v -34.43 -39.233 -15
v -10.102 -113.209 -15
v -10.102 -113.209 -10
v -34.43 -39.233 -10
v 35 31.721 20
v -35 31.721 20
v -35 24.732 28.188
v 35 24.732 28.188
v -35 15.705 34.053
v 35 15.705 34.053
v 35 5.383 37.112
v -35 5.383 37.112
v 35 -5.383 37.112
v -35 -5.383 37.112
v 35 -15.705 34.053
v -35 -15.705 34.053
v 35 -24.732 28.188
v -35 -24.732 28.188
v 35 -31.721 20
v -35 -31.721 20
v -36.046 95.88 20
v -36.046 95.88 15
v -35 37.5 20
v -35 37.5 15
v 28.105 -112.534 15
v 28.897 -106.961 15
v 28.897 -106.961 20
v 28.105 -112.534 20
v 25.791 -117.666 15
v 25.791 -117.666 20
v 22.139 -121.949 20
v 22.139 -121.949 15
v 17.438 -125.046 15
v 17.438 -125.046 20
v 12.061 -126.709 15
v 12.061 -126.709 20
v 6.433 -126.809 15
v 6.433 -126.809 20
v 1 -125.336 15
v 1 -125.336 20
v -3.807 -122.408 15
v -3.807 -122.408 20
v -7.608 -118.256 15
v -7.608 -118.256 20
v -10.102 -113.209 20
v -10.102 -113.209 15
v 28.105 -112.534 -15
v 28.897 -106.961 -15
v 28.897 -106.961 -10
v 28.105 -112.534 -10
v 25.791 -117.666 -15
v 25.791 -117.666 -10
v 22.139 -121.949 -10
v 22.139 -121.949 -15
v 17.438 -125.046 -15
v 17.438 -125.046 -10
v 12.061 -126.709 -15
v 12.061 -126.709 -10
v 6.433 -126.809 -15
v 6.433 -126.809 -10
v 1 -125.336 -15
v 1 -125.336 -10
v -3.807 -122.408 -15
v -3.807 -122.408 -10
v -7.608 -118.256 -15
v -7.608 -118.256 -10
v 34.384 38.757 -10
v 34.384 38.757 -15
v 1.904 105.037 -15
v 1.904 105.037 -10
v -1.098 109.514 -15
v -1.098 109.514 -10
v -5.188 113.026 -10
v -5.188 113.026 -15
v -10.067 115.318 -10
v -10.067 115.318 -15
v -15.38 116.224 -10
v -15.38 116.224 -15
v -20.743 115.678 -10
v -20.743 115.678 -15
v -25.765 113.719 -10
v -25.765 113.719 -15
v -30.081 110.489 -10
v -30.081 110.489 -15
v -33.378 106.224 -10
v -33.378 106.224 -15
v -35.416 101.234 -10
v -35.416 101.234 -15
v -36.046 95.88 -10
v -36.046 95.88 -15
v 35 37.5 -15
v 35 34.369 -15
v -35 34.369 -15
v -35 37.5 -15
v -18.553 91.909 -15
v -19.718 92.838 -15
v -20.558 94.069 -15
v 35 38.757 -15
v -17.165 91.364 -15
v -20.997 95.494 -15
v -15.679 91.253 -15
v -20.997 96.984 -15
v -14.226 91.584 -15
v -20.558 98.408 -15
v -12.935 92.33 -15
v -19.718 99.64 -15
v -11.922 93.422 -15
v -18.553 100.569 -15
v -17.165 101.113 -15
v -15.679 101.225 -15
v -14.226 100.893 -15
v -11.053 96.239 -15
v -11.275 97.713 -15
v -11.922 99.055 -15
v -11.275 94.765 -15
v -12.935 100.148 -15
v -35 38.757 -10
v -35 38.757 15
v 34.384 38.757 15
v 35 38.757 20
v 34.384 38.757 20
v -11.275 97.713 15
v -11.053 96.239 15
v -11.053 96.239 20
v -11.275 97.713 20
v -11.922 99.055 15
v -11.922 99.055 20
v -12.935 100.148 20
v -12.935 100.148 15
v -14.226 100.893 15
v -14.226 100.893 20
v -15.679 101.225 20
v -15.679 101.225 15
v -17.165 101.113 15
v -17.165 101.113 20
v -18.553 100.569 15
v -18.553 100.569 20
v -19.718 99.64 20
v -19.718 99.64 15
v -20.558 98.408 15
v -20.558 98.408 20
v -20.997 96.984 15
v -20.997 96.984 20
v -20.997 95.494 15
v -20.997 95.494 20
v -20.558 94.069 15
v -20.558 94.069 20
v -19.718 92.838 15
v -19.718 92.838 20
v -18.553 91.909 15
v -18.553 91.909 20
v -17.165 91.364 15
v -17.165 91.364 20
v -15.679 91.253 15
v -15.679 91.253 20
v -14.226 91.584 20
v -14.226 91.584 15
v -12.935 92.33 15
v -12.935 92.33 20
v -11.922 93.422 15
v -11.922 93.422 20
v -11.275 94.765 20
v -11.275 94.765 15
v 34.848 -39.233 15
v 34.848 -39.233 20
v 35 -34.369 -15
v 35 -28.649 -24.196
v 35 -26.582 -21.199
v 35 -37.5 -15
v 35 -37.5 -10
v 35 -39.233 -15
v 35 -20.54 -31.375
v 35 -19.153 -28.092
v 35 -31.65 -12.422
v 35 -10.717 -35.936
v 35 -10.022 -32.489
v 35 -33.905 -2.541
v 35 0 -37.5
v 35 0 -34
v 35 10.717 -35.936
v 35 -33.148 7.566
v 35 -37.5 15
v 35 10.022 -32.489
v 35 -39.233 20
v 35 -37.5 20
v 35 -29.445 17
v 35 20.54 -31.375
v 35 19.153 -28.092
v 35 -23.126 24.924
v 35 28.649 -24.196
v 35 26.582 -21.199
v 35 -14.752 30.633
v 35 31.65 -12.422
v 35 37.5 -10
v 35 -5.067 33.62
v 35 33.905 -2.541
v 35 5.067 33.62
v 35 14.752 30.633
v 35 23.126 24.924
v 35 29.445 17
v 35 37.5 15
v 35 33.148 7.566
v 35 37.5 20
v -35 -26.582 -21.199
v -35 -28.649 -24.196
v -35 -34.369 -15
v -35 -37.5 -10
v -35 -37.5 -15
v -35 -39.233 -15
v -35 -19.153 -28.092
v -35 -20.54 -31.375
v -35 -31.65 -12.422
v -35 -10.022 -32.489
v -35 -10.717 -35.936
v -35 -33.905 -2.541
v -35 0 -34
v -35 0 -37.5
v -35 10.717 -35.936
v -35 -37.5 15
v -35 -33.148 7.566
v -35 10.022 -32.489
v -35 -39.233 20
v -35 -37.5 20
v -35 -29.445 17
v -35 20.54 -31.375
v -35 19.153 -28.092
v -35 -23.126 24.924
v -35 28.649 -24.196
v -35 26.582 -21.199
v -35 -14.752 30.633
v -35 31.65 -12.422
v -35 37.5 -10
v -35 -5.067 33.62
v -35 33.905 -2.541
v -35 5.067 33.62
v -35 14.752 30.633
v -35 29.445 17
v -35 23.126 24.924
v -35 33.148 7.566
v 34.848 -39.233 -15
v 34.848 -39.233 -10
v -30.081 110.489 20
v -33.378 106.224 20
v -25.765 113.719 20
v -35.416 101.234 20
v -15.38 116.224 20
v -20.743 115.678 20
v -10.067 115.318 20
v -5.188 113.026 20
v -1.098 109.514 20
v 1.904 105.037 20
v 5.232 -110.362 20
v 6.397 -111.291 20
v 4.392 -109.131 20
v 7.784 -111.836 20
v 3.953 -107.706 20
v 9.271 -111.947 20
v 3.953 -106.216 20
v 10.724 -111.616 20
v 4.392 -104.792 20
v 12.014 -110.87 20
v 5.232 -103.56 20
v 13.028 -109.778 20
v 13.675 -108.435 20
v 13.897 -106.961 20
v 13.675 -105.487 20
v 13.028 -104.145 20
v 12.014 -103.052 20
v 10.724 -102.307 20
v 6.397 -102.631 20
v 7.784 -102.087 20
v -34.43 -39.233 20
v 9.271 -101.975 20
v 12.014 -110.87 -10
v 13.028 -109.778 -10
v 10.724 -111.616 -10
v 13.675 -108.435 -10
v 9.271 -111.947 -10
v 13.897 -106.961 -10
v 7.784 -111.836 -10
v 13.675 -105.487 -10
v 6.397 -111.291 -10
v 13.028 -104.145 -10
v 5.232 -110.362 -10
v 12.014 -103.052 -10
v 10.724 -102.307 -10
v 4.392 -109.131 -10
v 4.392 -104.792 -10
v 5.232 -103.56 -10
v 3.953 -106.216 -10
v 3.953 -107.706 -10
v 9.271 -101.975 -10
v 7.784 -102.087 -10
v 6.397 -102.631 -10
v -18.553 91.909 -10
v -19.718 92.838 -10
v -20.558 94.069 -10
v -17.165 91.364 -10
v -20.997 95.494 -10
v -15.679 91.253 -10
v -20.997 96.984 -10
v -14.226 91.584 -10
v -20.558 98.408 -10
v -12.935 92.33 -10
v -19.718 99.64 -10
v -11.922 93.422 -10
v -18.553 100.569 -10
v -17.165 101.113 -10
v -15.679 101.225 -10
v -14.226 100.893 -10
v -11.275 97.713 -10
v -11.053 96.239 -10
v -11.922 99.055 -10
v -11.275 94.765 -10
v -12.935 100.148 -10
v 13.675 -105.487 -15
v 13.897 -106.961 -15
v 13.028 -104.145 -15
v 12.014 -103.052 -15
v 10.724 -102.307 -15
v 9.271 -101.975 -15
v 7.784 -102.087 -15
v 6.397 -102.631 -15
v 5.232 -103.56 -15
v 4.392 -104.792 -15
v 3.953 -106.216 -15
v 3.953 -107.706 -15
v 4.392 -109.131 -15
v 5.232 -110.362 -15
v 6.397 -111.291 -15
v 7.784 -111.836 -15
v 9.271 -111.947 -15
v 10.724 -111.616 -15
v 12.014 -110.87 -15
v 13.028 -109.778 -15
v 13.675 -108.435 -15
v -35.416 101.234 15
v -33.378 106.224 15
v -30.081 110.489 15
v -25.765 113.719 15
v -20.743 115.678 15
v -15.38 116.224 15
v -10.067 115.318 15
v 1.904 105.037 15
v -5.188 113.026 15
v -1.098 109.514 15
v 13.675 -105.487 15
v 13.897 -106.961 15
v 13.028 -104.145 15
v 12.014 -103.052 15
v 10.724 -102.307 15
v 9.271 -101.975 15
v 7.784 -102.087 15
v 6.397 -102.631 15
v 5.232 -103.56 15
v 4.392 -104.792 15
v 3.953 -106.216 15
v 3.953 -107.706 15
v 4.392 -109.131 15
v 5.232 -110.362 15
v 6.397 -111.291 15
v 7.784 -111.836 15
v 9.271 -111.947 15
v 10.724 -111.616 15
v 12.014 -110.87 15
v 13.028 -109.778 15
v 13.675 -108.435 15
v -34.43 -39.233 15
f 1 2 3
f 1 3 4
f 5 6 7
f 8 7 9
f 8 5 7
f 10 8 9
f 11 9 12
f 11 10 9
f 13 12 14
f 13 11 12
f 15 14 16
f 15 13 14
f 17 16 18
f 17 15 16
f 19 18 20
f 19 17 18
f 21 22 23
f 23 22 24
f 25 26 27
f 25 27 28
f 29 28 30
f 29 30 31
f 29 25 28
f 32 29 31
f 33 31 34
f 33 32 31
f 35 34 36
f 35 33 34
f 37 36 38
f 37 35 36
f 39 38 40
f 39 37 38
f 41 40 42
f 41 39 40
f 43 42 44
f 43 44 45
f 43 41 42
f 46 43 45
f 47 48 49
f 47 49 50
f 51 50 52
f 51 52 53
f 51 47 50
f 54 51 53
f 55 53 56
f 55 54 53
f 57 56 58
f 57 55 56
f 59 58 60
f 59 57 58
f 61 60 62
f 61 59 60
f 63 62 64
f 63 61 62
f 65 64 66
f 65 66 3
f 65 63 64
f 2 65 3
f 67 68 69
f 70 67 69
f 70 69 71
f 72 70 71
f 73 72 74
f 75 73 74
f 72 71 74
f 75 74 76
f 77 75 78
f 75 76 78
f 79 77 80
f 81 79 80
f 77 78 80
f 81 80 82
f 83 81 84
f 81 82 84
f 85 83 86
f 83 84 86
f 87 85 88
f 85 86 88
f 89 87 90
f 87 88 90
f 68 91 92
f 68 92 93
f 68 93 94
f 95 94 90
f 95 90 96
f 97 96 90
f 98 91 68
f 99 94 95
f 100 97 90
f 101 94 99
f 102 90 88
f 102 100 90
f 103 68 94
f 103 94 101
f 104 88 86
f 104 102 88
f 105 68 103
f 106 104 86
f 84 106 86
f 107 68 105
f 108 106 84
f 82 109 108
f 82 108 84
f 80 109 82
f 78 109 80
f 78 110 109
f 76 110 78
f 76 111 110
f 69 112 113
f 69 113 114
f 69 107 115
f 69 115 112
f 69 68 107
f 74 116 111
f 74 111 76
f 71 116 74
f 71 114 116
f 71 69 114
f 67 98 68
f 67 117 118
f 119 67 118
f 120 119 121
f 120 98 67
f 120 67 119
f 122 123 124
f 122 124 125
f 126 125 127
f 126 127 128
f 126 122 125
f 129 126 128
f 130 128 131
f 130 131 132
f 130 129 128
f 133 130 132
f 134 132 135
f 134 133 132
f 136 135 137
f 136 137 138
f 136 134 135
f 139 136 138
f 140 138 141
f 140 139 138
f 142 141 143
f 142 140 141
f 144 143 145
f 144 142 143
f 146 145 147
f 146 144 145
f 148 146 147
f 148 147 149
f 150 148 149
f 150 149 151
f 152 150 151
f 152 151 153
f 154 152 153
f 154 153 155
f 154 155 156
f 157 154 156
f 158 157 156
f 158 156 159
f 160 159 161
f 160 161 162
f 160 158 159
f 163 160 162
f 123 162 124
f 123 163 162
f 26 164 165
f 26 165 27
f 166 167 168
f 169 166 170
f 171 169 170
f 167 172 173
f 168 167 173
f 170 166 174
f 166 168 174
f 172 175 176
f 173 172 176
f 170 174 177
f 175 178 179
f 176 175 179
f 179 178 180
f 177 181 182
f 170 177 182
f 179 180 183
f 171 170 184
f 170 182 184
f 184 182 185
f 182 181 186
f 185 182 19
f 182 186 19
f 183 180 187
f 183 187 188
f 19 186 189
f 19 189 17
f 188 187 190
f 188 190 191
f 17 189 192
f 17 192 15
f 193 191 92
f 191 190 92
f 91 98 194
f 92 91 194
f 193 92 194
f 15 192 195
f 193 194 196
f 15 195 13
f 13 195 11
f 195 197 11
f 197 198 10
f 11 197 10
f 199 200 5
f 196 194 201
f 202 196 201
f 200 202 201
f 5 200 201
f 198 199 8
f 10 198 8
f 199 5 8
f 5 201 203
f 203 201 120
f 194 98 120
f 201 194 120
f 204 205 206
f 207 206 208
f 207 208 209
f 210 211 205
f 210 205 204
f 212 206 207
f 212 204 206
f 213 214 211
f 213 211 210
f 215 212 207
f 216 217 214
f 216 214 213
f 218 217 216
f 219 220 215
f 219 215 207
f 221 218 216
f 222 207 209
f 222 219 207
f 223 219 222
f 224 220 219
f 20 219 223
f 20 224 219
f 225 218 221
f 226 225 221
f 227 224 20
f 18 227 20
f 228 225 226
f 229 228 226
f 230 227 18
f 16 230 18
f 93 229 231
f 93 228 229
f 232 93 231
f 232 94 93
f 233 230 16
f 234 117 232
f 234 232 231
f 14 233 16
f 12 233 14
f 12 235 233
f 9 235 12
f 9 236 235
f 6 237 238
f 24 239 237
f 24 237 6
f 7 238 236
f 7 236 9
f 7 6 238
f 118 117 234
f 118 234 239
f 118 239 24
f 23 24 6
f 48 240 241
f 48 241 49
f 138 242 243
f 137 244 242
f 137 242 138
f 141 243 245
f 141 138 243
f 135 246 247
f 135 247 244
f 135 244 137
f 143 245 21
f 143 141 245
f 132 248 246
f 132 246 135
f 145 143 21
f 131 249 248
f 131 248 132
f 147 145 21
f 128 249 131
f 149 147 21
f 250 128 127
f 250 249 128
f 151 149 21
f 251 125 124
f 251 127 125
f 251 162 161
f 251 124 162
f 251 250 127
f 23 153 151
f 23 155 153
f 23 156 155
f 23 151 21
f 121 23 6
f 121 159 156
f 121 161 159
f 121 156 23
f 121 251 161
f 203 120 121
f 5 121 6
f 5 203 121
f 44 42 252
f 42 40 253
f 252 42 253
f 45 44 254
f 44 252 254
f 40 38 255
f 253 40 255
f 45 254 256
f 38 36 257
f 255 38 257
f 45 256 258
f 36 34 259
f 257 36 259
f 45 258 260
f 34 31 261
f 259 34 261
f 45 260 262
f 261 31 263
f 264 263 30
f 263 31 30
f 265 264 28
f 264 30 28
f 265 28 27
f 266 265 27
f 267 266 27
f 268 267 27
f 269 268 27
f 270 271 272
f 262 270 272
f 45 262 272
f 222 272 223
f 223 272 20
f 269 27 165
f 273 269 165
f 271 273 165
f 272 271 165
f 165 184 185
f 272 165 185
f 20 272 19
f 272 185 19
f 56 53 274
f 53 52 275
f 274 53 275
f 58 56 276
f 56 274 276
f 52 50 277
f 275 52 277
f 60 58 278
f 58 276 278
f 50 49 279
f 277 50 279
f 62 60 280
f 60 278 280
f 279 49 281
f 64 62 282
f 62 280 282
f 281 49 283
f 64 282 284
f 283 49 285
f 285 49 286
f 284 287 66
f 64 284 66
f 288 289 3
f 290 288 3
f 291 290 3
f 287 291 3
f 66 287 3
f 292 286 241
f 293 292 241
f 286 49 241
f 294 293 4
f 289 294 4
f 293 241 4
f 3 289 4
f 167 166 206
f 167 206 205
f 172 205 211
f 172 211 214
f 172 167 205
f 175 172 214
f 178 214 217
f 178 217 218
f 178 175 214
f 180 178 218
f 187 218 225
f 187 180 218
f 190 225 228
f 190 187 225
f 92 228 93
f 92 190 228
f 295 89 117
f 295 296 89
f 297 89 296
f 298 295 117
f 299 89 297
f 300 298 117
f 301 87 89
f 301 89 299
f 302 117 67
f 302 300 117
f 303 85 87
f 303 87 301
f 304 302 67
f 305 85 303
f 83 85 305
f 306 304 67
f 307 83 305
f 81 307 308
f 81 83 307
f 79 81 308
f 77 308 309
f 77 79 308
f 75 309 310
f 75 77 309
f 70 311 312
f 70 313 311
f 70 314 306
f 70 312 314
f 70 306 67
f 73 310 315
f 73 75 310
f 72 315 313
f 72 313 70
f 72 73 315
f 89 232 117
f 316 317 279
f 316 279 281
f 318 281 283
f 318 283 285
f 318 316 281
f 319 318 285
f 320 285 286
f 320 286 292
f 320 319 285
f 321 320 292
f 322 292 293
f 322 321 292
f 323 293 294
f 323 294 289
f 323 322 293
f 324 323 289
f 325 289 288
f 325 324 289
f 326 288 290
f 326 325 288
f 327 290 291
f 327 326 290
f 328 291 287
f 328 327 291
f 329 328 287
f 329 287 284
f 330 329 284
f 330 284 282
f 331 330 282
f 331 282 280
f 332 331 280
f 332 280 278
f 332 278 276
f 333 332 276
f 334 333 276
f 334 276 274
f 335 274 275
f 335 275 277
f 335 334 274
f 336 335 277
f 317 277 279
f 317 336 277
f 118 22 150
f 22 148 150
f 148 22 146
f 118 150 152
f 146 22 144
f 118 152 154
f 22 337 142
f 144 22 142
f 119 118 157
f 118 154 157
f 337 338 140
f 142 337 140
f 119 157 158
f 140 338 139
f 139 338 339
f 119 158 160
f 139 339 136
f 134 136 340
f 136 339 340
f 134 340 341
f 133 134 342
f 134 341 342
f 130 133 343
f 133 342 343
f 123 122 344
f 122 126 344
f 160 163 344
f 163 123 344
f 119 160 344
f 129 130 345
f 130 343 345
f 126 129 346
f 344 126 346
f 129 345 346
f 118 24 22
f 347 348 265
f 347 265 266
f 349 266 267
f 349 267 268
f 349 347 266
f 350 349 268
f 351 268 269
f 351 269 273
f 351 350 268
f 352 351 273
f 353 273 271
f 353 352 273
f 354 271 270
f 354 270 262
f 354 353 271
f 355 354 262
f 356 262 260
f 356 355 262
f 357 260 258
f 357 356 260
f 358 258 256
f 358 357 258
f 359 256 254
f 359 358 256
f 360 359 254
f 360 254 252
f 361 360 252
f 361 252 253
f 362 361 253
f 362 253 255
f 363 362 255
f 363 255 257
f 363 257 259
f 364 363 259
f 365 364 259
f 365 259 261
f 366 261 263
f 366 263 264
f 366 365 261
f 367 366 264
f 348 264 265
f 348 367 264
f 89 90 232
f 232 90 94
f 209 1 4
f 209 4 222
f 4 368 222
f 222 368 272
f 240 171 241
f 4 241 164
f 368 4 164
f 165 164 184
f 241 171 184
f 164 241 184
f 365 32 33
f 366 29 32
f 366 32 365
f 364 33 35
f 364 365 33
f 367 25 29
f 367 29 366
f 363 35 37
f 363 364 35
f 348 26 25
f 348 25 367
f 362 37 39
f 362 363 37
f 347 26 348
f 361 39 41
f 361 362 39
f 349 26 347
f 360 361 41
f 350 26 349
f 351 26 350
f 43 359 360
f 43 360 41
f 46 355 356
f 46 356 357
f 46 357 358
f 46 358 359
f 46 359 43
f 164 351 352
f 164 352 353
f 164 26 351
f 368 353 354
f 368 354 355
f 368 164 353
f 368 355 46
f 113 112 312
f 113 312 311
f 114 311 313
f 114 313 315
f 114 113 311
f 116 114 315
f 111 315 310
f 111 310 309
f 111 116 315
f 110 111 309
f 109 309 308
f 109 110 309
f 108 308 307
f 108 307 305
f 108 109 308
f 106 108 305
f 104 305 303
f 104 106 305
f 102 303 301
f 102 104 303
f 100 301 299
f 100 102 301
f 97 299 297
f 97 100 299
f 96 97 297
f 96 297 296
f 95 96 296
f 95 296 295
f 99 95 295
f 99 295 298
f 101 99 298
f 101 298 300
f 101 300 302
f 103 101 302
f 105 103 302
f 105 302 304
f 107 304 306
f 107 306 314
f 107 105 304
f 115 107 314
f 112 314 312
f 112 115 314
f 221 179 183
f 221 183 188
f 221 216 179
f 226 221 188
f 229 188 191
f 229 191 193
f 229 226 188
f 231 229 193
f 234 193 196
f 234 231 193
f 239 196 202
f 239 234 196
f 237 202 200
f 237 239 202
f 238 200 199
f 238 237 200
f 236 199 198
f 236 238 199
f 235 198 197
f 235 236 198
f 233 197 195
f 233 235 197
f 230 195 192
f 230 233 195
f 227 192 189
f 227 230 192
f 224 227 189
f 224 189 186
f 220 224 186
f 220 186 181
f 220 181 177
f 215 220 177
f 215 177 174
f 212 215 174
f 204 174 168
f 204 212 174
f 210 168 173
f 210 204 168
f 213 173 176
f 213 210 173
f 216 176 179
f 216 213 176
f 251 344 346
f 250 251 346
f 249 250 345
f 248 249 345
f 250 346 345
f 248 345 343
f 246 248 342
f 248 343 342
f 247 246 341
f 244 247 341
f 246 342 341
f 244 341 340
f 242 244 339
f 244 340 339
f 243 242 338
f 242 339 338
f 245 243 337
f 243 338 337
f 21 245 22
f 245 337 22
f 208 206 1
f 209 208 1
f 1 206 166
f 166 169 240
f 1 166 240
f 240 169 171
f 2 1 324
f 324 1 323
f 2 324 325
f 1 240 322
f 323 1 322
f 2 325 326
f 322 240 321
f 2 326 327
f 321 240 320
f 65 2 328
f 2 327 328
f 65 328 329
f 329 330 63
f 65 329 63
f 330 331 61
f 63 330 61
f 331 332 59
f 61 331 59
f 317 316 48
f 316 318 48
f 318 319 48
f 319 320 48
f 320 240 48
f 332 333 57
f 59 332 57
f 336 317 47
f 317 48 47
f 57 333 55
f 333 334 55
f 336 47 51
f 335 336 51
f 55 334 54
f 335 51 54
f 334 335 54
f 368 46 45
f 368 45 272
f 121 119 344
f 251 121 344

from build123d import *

# Parameters (mm, degrees)
SKETCH1_R             = 37.5
SKETCH1_R_2           = 34
BOSS_EXTRUDE1_DEPTH   = 35
BOSS_EXTRUDE2_START   = 15
SKETCH2_R             = 5
BOSS_EXTRUDE2_DEPTH   = 5
BOSS_EXTRUDE2_2_DEPTH = 5
BOSS_EXTRUDE3_START   = -15
SKETCH2_2_R           = 5
BOSS_EXTRUDE3_DEPTH   = 5
BOSS_EXTRUDE3_2_DEPTH = 5
BOSS_EXTRUDE4_DEPTH   = 70
BOSS_EXTRUDE5_START   = -70
BOSS_EXTRUDE5_DEPTH   = 70


with BuildPart() as part:
    # Sketch1 → Boss-Extrude1 (new, symmetric)
    with BuildSketch(Plane(origin=(0, 0, 0), x_dir=(0, 0, -1), z_dir=(1, 0, 0))):
        Circle(SKETCH1_R)
        Circle(SKETCH1_R_2, mode=Mode.SUBTRACT)
    extrude(amount=BOSS_EXTRUDE1_DEPTH, both=True)



with BuildPart() as body_2:
    # Sketch2 → Boss-Extrude2 (new body)
    with BuildSketch(Plane.XY.offset(BOSS_EXTRUDE2_START)):
        with BuildLine():
            Line((-36.046360502, 95.880386994), (-35, 37.5))
            Line((-35, 37.5), (35, 37.5))
            Line((35, 37.5), (1.90425986, 105.037379634))
            ThreePointArc((1.90425986, 105.037379634), (-20.743145305, 115.677666176), (-36.046360502, 95.880386994))
        make_face()
        with Locations((-16.052783226, 96.238734902)):
            Circle(SKETCH2_R, mode=Mode.SUBTRACT)
    extrude(amount=BOSS_EXTRUDE2_DEPTH)


with BuildPart() as body_3:
    # Sketch2 → Boss-Extrude2 2 (new body)
    with BuildSketch(Plane.XY.offset(BOSS_EXTRUDE2_START)):
        with BuildLine():
            Line((-35, -37.5), (35, -37.5))
            Line((35, -37.5), (28.89703955, -106.961265098))
            ThreePointArc((28.89703955, -106.961265098), (12.060917272, -126.709426475), (-10.101948226, -113.209341881))
            Line((-10.101948226, -113.209341881), (-35, -37.5))
        make_face()
        with Locations((8.89703955, -106.961265098)):
            Circle(SKETCH2_R, mode=Mode.SUBTRACT)
    extrude(amount=BOSS_EXTRUDE2_2_DEPTH)


with BuildPart() as body_4:
    # Sketch2<2> → Boss-Extrude3 (new body)
    with BuildSketch(Plane.XY.offset(BOSS_EXTRUDE3_START)):
        with BuildLine():
            Line((-36.046360502, 95.880386994), (-35, 37.5))
            Line((-35, 37.5), (35, 37.5))
            Line((35, 37.5), (1.90425986, 105.037379634))
            ThreePointArc((1.90425986, 105.037379634), (-20.743145305, 115.677666176), (-36.046360502, 95.880386994))
        make_face()
        with Locations((-16.052783226, 96.238734902)):
            Circle(SKETCH2_2_R, mode=Mode.SUBTRACT)
    extrude(amount=BOSS_EXTRUDE3_DEPTH)


with BuildPart() as body_5:
    # Sketch2<2> → Boss-Extrude3 2 (new body)
    with BuildSketch(Plane.XY.offset(BOSS_EXTRUDE3_START)):
        with BuildLine():
            Line((-35, -37.5), (35, -37.5))
            Line((35, -37.5), (28.89703955, -106.961265098))
            ThreePointArc((28.89703955, -106.961265098), (12.060917272, -126.709426475), (-10.101948226, -113.209341881))
            Line((-10.101948226, -113.209341881), (-35, -37.5))
        make_face()
        with Locations((8.89703955, -106.961265098)):
            Circle(SKETCH2_2_R, mode=Mode.SUBTRACT)
    extrude(amount=BOSS_EXTRUDE3_2_DEPTH)


with BuildPart() as part_1:
    add(part.part)

    add(body_2.part)  # Boss-Extrude4 merges body 2

    add(body_4.part)  # Boss-Extrude4 merges body 4
    # Sketch3 → Boss-Extrude4 (add)
    with BuildSketch(Plane(origin=(35, 0, 0), x_dir=(0, 0, -1), z_dir=(1, 0, 0))):
        with BuildLine():
            Line((-20, 37.5), (-20, 31.721443851))
            ThreePointArc((-20, 31.721443851), (-2.828923646, 37.393143636), (15, 34.369317712))
            Line((15, 34.369317712), (15, 37.5))
            Line((15, 37.5), (15, 38.756727822))
            Line((15, 38.756727822), (-20, 38.756727822))
            Line((-20, 38.756727822), (-20, 37.5))
        make_face()
    extrude(amount=-BOSS_EXTRUDE4_DEPTH)


    add(body_3.part)  # Boss-Extrude5 merges body 3

    add(body_5.part)  # Boss-Extrude5 merges body 5
    # Sketch4 → Boss-Extrude5 (add)
    with BuildSketch(Plane.ZY.offset(35).offset(BOSS_EXTRUDE5_START)):
        with BuildLine():
            Line((-15, -39.232593617), (20, -39.232593617))
            Line((20, -39.232593617), (20, -31.721443851))
            ThreePointArc((20, -31.721443851), (2.828923646, -37.393143636), (-15, -34.369317712))
            Line((-15, -34.369317712), (-15, -39.232593617))
        make_face()
    extrude(amount=BOSS_EXTRUDE5_DEPTH)


solid = part_1.part
